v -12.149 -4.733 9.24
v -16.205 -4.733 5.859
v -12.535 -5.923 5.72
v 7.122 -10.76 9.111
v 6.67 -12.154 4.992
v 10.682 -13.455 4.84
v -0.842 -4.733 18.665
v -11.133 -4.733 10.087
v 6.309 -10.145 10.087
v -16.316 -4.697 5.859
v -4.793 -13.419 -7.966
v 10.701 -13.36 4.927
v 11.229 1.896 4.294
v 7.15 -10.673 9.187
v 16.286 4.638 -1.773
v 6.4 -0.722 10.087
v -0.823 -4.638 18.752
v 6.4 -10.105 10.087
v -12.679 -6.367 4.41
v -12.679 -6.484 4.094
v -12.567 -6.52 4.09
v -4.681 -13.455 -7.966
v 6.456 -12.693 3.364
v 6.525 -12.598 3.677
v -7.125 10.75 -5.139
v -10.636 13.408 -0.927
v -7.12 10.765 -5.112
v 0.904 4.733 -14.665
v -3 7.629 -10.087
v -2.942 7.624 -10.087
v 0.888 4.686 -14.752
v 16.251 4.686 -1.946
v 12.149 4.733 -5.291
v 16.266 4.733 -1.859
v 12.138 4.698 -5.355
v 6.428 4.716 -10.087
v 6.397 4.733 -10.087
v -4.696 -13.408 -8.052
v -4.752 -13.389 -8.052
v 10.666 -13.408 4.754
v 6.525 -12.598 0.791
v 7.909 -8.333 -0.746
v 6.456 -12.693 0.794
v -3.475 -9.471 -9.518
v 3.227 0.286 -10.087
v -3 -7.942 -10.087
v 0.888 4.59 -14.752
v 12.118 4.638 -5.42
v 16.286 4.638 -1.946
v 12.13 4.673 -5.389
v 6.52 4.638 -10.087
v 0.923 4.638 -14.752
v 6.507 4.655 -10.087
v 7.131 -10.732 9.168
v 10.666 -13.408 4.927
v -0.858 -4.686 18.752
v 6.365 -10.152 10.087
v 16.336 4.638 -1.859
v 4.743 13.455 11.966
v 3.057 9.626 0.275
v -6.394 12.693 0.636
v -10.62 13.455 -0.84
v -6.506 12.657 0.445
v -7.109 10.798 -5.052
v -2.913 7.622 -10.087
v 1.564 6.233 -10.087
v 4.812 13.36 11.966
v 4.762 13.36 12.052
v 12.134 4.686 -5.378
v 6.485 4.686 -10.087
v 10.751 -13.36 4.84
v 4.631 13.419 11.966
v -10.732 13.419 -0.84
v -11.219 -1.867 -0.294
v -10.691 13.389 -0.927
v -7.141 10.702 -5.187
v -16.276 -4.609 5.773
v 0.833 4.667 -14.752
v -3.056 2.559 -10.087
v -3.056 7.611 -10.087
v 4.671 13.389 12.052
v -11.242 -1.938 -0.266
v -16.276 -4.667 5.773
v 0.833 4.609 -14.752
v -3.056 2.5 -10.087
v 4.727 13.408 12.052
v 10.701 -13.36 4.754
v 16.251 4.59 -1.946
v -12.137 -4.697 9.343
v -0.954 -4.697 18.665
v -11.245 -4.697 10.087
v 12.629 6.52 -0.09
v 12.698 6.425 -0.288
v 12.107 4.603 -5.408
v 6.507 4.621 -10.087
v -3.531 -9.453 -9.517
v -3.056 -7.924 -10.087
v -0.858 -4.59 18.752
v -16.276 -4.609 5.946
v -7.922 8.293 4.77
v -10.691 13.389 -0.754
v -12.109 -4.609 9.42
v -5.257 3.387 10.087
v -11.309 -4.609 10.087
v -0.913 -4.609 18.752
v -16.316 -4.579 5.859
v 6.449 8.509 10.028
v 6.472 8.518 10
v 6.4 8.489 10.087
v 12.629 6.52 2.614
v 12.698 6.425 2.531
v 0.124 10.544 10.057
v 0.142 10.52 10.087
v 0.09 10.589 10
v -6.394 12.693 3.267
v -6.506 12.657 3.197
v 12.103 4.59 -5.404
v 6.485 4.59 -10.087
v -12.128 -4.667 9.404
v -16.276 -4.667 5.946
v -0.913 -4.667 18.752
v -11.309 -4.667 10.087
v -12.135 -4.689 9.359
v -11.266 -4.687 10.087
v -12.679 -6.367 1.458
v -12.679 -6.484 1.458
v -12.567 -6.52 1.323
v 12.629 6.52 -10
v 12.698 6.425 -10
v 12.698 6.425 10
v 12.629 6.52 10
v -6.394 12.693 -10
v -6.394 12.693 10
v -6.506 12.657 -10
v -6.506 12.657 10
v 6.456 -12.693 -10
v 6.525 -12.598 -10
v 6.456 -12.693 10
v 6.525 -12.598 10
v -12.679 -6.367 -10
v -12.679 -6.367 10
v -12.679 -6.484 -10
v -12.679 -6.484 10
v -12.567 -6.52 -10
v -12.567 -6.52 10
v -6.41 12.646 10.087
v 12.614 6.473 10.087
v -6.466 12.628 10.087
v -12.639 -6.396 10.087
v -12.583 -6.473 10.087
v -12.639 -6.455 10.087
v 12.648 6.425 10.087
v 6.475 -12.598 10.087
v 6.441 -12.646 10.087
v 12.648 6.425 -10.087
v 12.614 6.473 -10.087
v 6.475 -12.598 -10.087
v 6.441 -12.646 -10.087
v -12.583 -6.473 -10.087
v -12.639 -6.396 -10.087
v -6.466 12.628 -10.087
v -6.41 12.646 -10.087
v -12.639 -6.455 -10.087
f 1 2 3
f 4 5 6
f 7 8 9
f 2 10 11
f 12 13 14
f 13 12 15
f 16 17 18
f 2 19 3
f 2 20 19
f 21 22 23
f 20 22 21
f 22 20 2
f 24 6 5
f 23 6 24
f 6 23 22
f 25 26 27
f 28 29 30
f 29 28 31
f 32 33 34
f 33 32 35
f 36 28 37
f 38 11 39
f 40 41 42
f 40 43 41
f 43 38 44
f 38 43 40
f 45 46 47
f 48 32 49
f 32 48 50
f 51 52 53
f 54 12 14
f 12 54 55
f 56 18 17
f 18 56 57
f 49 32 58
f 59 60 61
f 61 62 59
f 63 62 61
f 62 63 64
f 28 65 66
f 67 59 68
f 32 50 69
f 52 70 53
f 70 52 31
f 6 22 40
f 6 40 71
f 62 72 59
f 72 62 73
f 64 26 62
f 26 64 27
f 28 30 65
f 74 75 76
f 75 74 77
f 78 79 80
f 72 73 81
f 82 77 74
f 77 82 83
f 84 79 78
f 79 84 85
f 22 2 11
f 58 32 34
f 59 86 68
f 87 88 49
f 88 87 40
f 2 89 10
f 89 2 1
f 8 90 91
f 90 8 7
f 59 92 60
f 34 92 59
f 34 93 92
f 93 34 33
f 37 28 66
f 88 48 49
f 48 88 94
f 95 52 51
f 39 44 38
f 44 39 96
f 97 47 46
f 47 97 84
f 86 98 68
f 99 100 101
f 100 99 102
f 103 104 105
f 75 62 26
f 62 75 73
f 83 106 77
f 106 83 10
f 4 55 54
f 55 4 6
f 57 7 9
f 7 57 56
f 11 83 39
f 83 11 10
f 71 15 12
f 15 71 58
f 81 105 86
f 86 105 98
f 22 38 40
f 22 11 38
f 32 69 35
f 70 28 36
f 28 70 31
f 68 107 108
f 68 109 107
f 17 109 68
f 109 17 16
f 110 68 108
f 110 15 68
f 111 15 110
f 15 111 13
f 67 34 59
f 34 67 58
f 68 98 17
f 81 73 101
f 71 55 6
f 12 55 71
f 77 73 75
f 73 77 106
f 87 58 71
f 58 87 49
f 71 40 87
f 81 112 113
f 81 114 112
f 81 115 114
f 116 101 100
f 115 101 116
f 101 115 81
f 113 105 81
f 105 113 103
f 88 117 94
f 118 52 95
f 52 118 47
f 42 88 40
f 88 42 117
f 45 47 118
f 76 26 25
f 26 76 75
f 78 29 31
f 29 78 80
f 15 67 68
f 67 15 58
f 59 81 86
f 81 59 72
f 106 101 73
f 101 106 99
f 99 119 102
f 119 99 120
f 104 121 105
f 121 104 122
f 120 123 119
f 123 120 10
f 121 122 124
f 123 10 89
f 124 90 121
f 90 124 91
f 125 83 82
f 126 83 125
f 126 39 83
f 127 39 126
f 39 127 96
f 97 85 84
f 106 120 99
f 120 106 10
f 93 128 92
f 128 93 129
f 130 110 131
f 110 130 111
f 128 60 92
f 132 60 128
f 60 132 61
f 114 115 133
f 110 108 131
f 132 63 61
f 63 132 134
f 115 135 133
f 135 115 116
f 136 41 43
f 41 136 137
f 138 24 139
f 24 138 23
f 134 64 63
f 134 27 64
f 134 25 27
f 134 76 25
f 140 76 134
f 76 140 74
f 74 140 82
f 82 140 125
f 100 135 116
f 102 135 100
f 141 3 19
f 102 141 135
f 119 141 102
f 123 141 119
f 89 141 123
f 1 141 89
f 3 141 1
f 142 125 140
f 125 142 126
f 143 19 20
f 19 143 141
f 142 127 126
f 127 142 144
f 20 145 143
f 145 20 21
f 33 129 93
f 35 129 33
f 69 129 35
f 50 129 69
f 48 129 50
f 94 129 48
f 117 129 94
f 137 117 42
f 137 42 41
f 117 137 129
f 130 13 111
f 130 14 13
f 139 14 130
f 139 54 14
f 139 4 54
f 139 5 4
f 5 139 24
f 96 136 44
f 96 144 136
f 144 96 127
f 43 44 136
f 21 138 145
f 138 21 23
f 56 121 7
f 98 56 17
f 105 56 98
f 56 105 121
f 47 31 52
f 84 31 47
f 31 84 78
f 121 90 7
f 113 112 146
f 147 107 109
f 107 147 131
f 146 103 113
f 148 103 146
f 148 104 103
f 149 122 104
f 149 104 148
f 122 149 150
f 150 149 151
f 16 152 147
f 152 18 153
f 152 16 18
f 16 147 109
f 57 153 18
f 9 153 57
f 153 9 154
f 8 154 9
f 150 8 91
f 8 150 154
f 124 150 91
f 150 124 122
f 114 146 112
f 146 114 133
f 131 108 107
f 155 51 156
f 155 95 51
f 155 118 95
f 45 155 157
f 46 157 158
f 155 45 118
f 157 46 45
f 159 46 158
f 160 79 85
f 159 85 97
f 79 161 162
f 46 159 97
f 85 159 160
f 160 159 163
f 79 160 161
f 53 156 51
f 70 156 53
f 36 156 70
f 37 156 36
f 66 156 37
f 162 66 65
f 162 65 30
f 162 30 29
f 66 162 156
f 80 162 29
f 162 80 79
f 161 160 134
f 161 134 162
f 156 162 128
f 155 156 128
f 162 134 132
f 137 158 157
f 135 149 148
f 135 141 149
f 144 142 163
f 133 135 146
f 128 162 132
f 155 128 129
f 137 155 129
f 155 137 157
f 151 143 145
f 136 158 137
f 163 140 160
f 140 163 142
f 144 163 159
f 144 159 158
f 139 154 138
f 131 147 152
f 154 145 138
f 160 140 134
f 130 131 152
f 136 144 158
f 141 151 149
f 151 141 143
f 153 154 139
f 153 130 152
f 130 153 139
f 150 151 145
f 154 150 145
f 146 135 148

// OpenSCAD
// Auto-generated OpenSCAD file

    shift = 2;

    inner_points = 10*[[0.6425345358559449, -1.259821175579955, -0.999999999999981], [0.6425345358559096, -1.2598211755799429, 1.0000000000000189], [-1.2598211627565699, -0.642534535552414, -1.0000000000000182], [1.2598211758834859, 0.6425345230325596, -0.9999999999999818], [-0.6425345227290287, 1.2598211630601008, -1.0000000000000189], [1.2598211758834508, 0.6425345230325717, 1.0000000000000182], [-1.259821162756605, -0.6425345355524019, 0.9999999999999818], [-0.642534522729064, 1.259821163060113, 0.999999999999981]];

    outer_points_unshifted = 10*[[-0.08729545859213583, -0.4638004049384796, 1.666513932521445], [-1.6235597497391208, -0.4638004049384796, 0.38593124181121496], [1.0650995308277986, -1.3359974492411661, 0.28403134519186607], [0.47116476031918614, 1.3359974492411661, 0.9965513455183639], [1.6235597497391208, 0.4638004049384796, -0.38593124181121496], [-1.0650995308277986, 1.3359974492411661, -0.28403134519186607], [-0.47116476031918614, -1.3359974492411661, -0.9965513455183639], [0.08729545859213583, 0.4638004049384796, -1.666513932521445]];
    
    outer_points = [for (p = outer_points_unshifted) [p[0], p[1], p[2] + shift]];


    // Convex hull for inner set (I)
    module inner_hull() {
        hull() {
            for (p = inner_points) {
                translate(p) sphere(r=0.1);
            }
        }
    }

    // Convex hull for outer set (O) minus inner hull (O \ I)
    module outer_minus_inner() {
        difference() {
            hull() {
                for (p = outer_points) {
                    translate(p) sphere(r=0.1);
                }
            }
            inner_hull(); // Subtract inner hull
        }
    }

    // Convex hull for outer set (O) minus all translated inner hulls
    module outer_minus_AllTranslationInner() {
        difference() {
            hull() {
                for (p = outer_points) {
                    translate(p) sphere(r=0.1);
                }
            }
            hull() {
                translate([0,0,50]) inner_hull();
                translate([0,0,-50]) inner_hull();
            }; // Subtract translated inner hulls
        }
    }

    // Difference between outer_minus_inner and outer_minus_AllTranslationInner
    module outer_minus_inner_diff() {
        difference() {
            // Outer minus inner
            difference() {
                hull() {
                    for (p = outer_points) {
                        translate(p) sphere(r=0.1);
                    }
                }
                inner_hull();
            }

            // Subtract Outer minus AllTranslationInner
            difference() {
                hull() {
                    for (p = outer_points) {
                        translate(p) sphere(r=0.1);
                    }
                }
                hull() {
                    translate([0,0,50]) inner_hull();
                    translate([0,0,-50]) inner_hull();
                };
            }
        }
    }

    // Rendering all with colors applied
    color([1, 0, 0, 0.5]) inner_hull(); // Transparent red
    color([0, 1, 0, 1]) outer_minus_AllTranslationInner(); // Opaque green
    color([1, 1, 0, 1]) outer_minus_inner_diff(); // Opaque yellow
    
